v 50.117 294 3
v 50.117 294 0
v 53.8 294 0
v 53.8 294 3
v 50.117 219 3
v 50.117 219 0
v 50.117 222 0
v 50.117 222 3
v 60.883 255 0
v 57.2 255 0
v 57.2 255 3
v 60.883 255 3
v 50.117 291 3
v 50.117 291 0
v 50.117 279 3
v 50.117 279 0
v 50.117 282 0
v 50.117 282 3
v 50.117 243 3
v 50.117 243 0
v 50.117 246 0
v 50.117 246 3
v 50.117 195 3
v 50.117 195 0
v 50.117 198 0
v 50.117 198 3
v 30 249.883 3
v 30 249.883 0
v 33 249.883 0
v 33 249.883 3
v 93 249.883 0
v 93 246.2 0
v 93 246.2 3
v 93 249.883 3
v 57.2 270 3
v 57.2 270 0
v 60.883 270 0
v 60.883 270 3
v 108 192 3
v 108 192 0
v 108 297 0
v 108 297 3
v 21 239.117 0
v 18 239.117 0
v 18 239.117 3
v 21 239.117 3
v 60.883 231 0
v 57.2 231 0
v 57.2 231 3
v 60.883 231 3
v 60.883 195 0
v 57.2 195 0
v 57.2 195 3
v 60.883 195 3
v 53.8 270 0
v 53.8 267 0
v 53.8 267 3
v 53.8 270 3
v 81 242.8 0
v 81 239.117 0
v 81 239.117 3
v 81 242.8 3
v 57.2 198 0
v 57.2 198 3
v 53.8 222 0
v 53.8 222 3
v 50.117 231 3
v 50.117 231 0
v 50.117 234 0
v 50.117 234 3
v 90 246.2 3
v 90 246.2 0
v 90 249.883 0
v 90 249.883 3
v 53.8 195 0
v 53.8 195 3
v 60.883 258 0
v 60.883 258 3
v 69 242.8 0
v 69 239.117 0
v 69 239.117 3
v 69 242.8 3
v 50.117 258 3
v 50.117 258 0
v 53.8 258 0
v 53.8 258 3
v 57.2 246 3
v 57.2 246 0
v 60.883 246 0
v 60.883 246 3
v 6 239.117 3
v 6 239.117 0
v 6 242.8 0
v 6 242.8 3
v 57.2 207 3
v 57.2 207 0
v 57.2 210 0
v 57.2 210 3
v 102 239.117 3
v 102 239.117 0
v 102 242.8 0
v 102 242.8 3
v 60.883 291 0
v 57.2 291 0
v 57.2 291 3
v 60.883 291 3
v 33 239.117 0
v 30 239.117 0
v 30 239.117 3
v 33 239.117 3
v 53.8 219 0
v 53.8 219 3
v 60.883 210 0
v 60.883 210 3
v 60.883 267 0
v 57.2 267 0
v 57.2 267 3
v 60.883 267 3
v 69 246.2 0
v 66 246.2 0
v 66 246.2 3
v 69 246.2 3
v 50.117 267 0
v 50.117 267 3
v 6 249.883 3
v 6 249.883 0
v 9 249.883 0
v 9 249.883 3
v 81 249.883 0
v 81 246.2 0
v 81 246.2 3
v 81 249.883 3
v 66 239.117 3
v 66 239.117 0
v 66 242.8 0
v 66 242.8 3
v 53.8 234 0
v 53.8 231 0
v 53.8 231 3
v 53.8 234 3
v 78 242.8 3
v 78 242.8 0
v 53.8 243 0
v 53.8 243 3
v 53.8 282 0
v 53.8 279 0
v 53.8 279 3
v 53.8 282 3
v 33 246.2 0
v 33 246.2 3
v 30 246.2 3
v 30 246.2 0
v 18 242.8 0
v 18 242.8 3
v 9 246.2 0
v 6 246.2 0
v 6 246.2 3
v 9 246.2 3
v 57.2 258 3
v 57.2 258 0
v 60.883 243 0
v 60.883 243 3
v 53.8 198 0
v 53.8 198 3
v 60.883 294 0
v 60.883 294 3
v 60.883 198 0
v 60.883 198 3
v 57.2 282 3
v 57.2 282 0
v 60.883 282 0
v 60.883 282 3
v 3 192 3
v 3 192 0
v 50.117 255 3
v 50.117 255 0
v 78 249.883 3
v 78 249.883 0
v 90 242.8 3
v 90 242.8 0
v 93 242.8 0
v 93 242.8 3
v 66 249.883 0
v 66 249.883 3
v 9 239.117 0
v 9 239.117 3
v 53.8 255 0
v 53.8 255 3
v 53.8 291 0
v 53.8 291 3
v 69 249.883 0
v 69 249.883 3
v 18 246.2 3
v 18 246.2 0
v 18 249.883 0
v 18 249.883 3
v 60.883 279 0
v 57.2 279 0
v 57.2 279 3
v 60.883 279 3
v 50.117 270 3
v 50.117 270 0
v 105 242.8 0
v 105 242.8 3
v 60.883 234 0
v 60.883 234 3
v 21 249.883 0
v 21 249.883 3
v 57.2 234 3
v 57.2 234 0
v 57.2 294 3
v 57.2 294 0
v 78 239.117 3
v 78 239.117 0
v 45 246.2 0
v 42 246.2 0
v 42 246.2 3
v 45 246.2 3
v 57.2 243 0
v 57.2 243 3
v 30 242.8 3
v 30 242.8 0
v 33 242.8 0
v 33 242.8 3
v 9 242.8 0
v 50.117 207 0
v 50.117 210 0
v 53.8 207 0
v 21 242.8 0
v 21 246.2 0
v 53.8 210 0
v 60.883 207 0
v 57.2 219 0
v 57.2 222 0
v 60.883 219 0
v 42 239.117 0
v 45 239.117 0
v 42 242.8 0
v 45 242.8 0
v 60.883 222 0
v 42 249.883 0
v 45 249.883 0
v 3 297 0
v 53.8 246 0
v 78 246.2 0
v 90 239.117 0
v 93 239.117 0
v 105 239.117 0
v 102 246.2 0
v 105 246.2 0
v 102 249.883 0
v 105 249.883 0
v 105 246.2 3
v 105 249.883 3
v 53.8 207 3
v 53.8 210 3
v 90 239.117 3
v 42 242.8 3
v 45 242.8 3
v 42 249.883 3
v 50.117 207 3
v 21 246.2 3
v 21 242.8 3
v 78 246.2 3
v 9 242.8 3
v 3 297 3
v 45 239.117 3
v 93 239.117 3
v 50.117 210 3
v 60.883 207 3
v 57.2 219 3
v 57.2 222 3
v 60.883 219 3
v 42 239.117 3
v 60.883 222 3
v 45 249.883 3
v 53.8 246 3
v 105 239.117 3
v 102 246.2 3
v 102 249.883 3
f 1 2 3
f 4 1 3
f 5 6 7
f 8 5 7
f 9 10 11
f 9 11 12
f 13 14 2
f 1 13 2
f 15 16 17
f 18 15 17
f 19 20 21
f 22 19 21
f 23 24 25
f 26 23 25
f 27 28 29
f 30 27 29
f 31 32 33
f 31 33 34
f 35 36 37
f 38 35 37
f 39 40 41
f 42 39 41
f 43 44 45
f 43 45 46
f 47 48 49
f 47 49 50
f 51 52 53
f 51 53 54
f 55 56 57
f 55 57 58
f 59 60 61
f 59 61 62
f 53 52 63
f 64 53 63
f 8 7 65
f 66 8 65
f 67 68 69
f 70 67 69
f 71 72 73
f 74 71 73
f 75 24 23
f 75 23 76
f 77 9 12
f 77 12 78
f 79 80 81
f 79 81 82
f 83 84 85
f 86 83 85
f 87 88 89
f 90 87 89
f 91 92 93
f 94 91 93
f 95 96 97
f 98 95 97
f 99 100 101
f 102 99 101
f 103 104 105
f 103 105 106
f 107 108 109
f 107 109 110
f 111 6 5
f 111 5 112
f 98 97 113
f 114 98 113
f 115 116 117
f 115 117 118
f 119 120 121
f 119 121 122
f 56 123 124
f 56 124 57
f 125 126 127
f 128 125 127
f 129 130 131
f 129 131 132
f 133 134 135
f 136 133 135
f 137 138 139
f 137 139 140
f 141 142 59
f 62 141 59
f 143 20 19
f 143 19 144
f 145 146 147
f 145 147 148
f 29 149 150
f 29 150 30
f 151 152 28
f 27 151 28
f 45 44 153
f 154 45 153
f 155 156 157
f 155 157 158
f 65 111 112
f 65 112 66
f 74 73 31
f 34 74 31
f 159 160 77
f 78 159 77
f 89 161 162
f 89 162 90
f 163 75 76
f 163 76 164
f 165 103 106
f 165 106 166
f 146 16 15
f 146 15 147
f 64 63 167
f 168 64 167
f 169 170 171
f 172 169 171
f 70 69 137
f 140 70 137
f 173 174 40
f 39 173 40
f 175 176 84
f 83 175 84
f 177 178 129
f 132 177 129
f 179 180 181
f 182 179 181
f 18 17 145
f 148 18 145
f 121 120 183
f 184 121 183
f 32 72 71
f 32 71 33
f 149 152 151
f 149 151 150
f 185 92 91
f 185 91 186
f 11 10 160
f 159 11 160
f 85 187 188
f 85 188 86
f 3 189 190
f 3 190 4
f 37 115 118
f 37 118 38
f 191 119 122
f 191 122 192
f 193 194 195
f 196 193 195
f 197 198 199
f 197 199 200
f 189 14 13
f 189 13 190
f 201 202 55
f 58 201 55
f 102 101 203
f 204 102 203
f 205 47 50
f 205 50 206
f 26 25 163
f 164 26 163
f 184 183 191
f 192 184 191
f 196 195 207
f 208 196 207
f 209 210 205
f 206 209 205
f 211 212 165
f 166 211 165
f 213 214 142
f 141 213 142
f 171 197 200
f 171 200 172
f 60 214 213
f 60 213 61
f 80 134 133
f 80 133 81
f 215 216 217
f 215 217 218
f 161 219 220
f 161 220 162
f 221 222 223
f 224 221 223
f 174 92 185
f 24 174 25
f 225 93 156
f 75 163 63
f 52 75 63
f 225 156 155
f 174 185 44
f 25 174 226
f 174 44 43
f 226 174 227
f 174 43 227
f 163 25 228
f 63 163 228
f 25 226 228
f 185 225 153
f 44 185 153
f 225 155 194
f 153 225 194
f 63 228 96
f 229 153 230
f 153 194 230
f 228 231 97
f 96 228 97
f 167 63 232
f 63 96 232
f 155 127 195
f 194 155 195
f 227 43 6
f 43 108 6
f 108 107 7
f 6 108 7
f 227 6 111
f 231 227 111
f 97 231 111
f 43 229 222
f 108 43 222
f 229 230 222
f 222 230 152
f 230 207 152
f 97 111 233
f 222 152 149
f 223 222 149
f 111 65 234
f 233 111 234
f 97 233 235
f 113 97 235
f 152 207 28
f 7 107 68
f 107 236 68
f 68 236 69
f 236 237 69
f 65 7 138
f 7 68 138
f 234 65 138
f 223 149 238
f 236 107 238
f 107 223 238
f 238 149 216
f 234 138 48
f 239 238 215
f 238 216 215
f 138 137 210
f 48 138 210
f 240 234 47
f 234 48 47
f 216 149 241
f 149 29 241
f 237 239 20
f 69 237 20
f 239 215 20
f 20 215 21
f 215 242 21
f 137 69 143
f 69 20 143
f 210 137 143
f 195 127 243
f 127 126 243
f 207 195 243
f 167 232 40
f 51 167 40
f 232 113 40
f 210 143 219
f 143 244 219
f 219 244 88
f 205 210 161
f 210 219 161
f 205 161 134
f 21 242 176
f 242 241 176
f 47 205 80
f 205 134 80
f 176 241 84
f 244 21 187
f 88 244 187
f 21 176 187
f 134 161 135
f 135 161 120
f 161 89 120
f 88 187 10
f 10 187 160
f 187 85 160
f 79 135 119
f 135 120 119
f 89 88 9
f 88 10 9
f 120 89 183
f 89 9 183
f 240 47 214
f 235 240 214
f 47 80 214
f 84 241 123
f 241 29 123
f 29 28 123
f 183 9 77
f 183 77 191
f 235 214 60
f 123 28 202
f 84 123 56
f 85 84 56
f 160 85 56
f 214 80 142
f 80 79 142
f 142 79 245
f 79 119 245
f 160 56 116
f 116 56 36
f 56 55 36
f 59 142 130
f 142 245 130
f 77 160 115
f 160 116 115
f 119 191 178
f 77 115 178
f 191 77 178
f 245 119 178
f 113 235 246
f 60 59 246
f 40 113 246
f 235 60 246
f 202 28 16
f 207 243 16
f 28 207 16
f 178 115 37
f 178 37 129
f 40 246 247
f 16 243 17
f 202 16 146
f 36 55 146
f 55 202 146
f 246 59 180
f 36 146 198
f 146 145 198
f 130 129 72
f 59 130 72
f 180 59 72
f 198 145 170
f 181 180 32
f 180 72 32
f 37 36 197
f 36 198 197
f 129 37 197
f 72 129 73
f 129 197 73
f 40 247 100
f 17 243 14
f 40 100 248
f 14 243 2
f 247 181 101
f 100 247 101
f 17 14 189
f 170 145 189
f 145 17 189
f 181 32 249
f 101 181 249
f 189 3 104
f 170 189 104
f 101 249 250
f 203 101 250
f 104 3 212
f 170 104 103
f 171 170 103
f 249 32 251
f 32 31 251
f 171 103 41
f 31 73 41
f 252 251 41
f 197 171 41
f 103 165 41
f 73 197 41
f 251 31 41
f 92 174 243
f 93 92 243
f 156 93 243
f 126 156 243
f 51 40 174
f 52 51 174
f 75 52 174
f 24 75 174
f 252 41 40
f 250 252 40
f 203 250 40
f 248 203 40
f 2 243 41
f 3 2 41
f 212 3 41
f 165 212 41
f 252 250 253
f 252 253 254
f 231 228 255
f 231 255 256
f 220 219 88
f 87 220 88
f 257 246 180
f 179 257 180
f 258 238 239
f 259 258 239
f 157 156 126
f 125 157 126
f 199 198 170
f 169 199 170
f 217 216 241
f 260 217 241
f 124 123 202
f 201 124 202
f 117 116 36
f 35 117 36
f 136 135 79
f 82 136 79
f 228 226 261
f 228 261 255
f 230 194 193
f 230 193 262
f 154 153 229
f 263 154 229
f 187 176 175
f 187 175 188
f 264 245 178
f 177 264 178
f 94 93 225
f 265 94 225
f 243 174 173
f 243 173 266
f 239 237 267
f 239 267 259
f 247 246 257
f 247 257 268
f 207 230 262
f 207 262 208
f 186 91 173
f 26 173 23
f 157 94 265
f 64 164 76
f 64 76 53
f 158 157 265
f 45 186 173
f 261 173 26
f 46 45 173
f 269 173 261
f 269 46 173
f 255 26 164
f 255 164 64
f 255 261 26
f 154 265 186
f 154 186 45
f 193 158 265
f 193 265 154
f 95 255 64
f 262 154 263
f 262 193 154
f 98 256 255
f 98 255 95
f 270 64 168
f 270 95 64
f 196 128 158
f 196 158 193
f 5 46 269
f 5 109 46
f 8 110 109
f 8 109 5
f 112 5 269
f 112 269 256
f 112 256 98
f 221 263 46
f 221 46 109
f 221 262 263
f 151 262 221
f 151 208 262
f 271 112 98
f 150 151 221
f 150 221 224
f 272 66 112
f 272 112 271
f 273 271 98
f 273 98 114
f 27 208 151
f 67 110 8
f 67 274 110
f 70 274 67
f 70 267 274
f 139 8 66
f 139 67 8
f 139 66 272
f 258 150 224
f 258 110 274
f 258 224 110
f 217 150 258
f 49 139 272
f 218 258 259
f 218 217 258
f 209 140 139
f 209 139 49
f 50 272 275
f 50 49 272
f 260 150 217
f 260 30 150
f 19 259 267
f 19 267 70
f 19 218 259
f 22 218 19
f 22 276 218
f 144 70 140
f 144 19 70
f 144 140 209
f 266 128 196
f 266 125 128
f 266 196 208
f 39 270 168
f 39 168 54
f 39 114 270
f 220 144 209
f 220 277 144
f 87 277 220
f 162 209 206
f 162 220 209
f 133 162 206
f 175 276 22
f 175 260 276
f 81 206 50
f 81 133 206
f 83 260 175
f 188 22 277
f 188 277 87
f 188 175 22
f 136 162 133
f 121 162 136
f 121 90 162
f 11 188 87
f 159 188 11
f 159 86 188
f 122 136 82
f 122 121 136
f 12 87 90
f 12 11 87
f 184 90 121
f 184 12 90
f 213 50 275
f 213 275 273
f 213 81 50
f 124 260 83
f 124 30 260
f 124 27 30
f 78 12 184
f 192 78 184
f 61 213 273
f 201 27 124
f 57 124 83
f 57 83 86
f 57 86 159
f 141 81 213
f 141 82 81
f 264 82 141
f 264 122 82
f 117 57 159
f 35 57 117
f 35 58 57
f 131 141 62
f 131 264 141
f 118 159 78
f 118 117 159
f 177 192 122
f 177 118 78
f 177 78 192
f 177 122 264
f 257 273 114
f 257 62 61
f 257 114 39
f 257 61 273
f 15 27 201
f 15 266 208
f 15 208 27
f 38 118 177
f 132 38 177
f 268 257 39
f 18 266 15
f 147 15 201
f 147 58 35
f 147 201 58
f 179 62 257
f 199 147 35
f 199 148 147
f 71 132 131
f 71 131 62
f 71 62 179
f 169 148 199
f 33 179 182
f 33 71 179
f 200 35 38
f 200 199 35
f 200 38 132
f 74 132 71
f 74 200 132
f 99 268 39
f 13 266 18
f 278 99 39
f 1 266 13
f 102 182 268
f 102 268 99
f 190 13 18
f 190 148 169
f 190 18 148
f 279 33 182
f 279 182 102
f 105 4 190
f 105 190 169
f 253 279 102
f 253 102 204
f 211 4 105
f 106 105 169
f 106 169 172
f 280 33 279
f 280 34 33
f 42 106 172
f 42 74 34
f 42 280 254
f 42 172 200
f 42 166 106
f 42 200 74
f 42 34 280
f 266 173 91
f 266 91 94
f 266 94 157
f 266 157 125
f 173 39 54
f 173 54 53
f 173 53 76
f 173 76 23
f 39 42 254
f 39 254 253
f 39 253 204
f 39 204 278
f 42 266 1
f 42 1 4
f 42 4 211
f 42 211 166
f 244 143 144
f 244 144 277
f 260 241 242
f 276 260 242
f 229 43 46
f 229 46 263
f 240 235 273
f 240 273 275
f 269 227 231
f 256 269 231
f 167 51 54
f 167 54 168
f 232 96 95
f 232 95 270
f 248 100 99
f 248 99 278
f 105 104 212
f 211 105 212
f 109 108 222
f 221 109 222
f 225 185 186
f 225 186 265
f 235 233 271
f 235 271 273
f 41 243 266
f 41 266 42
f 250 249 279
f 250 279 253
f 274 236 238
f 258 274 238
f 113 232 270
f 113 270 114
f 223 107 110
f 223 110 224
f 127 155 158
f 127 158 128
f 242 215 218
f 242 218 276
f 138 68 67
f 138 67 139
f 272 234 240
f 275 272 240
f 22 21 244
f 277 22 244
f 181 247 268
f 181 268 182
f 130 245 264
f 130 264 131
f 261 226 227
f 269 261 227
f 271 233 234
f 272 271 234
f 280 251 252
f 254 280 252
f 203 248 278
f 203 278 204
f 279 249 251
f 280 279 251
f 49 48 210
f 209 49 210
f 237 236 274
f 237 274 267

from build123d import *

# Parameters (mm, degrees)
SKETCH1_W           = 105
SKETCH1_H           = 105
SKETCH1_W_2         = 3
SKETCH1_H_2         = 3.682816402
SKETCH1_W_3         = 3.682816402
SKETCH1_H_3         = 3
BOSS_EXTRUDE1_DEPTH = 3


with BuildPart() as part:
    # Sketch1 → Boss-Extrude1 (new body)
    with BuildSketch(Plane.XY):
        with Locations((55.5, 244.5)):
            Rectangle(SKETCH1_W, SKETCH1_H)
        with Locations((19.5, 240.958607901)):
            Rectangle(SKETCH1_W_2, SKETCH1_H_2, mode=Mode.SUBTRACT)
        with Locations((7.5, 240.958607901)):
            Rectangle(SKETCH1_W_2, SKETCH1_H_2, mode=Mode.SUBTRACT)
        with Locations((31.5, 240.958607901)):
            Rectangle(SKETCH1_W_2, SKETCH1_H_2, mode=Mode.SUBTRACT)
        with Locations((51.958607901, 232.5)):
            Rectangle(SKETCH1_W_3, SKETCH1_H_3, mode=Mode.SUBTRACT)
        with Locations((51.958607901, 220.5)):
            Rectangle(SKETCH1_W_3, SKETCH1_H_3, mode=Mode.SUBTRACT)
        with Locations((51.958607901, 280.5)):
            Rectangle(SKETCH1_W_3, SKETCH1_H_3, mode=Mode.SUBTRACT)
        with Locations((51.958607901, 268.5)):
            Rectangle(SKETCH1_W_3, SKETCH1_H_3, mode=Mode.SUBTRACT)
        with Locations((79.5, 240.958607901)):
            Rectangle(SKETCH1_W_2, SKETCH1_H_2, mode=Mode.SUBTRACT)
        with Locations((91.5, 240.958607901)):
            Rectangle(SKETCH1_W_2, SKETCH1_H_2, mode=Mode.SUBTRACT)
        with Locations((51.958607901, 292.5)):
            Rectangle(SKETCH1_W_3, SKETCH1_H_3, mode=Mode.SUBTRACT)
        with Locations((7.5, 248.041392099)):
            Rectangle(SKETCH1_W_2, SKETCH1_H_2, mode=Mode.SUBTRACT)
        with Locations((19.5, 248.041392099)):
            Rectangle(SKETCH1_W_2, SKETCH1_H_2, mode=Mode.SUBTRACT)
        with Locations((31.5, 248.041392099)):
            Rectangle(SKETCH1_W_2, SKETCH1_H_2, mode=Mode.SUBTRACT)
        with Locations((67.5, 248.041392099)):
            Rectangle(SKETCH1_W_2, SKETCH1_H_2, mode=Mode.SUBTRACT)
        with Locations((43.5, 248.041392099)):
            Rectangle(SKETCH1_W_2, SKETCH1_H_2, mode=Mode.SUBTRACT)
        with Locations((79.5, 248.041392099)):
            Rectangle(SKETCH1_W_2, SKETCH1_H_2, mode=Mode.SUBTRACT)
        with Locations((91.5, 248.041392099)):
            Rectangle(SKETCH1_W_2, SKETCH1_H_2, mode=Mode.SUBTRACT)
        with Locations((103.5, 248.041392099)):
            Rectangle(SKETCH1_W_2, SKETCH1_H_2, mode=Mode.SUBTRACT)
        with Locations((43.5, 240.958607901)):
            Rectangle(SKETCH1_W_2, SKETCH1_H_2, mode=Mode.SUBTRACT)
        with Locations((67.5, 240.958607901)):
            Rectangle(SKETCH1_W_2, SKETCH1_H_2, mode=Mode.SUBTRACT)
        with Locations((103.5, 240.958607901)):
            Rectangle(SKETCH1_W_2, SKETCH1_H_2, mode=Mode.SUBTRACT)
        with Locations((59.041392099, 292.5)):
            Rectangle(SKETCH1_W_3, SKETCH1_H_3, mode=Mode.SUBTRACT)
        with Locations((59.041392099, 280.5)):
            Rectangle(SKETCH1_W_3, SKETCH1_H_3, mode=Mode.SUBTRACT)
        with Locations((59.041392099, 268.5)):
            Rectangle(SKETCH1_W_3, SKETCH1_H_3, mode=Mode.SUBTRACT)
        with Locations((59.041392099, 256.5)):
            Rectangle(SKETCH1_W_3, SKETCH1_H_3, mode=Mode.SUBTRACT)
        with Locations((59.041392099, 244.5)):
            Rectangle(SKETCH1_W_3, SKETCH1_H_3, mode=Mode.SUBTRACT)
        with Locations((59.041392099, 232.5)):
            Rectangle(SKETCH1_W_3, SKETCH1_H_3, mode=Mode.SUBTRACT)
        with Locations((59.041392099, 220.5)):
            Rectangle(SKETCH1_W_3, SKETCH1_H_3, mode=Mode.SUBTRACT)
        with Locations((59.041392099, 208.5)):
            Rectangle(SKETCH1_W_3, SKETCH1_H_3, mode=Mode.SUBTRACT)
        with Locations((59.041392099, 196.5)):
            Rectangle(SKETCH1_W_3, SKETCH1_H_3, mode=Mode.SUBTRACT)
        with Locations((51.958607901, 244.5)):
            Rectangle(SKETCH1_W_3, SKETCH1_H_3, mode=Mode.SUBTRACT)
        with Locations((51.958607901, 256.5)):
            Rectangle(SKETCH1_W_3, SKETCH1_H_3, mode=Mode.SUBTRACT)
        with Locations((51.958607901, 196.5)):
            Rectangle(SKETCH1_W_3, SKETCH1_H_3, mode=Mode.SUBTRACT)
        with Locations((51.958607901, 208.5)):
            Rectangle(SKETCH1_W_3, SKETCH1_H_3, mode=Mode.SUBTRACT)
    extrude(amount=BOSS_EXTRUDE1_DEPTH)


solid = part.part
